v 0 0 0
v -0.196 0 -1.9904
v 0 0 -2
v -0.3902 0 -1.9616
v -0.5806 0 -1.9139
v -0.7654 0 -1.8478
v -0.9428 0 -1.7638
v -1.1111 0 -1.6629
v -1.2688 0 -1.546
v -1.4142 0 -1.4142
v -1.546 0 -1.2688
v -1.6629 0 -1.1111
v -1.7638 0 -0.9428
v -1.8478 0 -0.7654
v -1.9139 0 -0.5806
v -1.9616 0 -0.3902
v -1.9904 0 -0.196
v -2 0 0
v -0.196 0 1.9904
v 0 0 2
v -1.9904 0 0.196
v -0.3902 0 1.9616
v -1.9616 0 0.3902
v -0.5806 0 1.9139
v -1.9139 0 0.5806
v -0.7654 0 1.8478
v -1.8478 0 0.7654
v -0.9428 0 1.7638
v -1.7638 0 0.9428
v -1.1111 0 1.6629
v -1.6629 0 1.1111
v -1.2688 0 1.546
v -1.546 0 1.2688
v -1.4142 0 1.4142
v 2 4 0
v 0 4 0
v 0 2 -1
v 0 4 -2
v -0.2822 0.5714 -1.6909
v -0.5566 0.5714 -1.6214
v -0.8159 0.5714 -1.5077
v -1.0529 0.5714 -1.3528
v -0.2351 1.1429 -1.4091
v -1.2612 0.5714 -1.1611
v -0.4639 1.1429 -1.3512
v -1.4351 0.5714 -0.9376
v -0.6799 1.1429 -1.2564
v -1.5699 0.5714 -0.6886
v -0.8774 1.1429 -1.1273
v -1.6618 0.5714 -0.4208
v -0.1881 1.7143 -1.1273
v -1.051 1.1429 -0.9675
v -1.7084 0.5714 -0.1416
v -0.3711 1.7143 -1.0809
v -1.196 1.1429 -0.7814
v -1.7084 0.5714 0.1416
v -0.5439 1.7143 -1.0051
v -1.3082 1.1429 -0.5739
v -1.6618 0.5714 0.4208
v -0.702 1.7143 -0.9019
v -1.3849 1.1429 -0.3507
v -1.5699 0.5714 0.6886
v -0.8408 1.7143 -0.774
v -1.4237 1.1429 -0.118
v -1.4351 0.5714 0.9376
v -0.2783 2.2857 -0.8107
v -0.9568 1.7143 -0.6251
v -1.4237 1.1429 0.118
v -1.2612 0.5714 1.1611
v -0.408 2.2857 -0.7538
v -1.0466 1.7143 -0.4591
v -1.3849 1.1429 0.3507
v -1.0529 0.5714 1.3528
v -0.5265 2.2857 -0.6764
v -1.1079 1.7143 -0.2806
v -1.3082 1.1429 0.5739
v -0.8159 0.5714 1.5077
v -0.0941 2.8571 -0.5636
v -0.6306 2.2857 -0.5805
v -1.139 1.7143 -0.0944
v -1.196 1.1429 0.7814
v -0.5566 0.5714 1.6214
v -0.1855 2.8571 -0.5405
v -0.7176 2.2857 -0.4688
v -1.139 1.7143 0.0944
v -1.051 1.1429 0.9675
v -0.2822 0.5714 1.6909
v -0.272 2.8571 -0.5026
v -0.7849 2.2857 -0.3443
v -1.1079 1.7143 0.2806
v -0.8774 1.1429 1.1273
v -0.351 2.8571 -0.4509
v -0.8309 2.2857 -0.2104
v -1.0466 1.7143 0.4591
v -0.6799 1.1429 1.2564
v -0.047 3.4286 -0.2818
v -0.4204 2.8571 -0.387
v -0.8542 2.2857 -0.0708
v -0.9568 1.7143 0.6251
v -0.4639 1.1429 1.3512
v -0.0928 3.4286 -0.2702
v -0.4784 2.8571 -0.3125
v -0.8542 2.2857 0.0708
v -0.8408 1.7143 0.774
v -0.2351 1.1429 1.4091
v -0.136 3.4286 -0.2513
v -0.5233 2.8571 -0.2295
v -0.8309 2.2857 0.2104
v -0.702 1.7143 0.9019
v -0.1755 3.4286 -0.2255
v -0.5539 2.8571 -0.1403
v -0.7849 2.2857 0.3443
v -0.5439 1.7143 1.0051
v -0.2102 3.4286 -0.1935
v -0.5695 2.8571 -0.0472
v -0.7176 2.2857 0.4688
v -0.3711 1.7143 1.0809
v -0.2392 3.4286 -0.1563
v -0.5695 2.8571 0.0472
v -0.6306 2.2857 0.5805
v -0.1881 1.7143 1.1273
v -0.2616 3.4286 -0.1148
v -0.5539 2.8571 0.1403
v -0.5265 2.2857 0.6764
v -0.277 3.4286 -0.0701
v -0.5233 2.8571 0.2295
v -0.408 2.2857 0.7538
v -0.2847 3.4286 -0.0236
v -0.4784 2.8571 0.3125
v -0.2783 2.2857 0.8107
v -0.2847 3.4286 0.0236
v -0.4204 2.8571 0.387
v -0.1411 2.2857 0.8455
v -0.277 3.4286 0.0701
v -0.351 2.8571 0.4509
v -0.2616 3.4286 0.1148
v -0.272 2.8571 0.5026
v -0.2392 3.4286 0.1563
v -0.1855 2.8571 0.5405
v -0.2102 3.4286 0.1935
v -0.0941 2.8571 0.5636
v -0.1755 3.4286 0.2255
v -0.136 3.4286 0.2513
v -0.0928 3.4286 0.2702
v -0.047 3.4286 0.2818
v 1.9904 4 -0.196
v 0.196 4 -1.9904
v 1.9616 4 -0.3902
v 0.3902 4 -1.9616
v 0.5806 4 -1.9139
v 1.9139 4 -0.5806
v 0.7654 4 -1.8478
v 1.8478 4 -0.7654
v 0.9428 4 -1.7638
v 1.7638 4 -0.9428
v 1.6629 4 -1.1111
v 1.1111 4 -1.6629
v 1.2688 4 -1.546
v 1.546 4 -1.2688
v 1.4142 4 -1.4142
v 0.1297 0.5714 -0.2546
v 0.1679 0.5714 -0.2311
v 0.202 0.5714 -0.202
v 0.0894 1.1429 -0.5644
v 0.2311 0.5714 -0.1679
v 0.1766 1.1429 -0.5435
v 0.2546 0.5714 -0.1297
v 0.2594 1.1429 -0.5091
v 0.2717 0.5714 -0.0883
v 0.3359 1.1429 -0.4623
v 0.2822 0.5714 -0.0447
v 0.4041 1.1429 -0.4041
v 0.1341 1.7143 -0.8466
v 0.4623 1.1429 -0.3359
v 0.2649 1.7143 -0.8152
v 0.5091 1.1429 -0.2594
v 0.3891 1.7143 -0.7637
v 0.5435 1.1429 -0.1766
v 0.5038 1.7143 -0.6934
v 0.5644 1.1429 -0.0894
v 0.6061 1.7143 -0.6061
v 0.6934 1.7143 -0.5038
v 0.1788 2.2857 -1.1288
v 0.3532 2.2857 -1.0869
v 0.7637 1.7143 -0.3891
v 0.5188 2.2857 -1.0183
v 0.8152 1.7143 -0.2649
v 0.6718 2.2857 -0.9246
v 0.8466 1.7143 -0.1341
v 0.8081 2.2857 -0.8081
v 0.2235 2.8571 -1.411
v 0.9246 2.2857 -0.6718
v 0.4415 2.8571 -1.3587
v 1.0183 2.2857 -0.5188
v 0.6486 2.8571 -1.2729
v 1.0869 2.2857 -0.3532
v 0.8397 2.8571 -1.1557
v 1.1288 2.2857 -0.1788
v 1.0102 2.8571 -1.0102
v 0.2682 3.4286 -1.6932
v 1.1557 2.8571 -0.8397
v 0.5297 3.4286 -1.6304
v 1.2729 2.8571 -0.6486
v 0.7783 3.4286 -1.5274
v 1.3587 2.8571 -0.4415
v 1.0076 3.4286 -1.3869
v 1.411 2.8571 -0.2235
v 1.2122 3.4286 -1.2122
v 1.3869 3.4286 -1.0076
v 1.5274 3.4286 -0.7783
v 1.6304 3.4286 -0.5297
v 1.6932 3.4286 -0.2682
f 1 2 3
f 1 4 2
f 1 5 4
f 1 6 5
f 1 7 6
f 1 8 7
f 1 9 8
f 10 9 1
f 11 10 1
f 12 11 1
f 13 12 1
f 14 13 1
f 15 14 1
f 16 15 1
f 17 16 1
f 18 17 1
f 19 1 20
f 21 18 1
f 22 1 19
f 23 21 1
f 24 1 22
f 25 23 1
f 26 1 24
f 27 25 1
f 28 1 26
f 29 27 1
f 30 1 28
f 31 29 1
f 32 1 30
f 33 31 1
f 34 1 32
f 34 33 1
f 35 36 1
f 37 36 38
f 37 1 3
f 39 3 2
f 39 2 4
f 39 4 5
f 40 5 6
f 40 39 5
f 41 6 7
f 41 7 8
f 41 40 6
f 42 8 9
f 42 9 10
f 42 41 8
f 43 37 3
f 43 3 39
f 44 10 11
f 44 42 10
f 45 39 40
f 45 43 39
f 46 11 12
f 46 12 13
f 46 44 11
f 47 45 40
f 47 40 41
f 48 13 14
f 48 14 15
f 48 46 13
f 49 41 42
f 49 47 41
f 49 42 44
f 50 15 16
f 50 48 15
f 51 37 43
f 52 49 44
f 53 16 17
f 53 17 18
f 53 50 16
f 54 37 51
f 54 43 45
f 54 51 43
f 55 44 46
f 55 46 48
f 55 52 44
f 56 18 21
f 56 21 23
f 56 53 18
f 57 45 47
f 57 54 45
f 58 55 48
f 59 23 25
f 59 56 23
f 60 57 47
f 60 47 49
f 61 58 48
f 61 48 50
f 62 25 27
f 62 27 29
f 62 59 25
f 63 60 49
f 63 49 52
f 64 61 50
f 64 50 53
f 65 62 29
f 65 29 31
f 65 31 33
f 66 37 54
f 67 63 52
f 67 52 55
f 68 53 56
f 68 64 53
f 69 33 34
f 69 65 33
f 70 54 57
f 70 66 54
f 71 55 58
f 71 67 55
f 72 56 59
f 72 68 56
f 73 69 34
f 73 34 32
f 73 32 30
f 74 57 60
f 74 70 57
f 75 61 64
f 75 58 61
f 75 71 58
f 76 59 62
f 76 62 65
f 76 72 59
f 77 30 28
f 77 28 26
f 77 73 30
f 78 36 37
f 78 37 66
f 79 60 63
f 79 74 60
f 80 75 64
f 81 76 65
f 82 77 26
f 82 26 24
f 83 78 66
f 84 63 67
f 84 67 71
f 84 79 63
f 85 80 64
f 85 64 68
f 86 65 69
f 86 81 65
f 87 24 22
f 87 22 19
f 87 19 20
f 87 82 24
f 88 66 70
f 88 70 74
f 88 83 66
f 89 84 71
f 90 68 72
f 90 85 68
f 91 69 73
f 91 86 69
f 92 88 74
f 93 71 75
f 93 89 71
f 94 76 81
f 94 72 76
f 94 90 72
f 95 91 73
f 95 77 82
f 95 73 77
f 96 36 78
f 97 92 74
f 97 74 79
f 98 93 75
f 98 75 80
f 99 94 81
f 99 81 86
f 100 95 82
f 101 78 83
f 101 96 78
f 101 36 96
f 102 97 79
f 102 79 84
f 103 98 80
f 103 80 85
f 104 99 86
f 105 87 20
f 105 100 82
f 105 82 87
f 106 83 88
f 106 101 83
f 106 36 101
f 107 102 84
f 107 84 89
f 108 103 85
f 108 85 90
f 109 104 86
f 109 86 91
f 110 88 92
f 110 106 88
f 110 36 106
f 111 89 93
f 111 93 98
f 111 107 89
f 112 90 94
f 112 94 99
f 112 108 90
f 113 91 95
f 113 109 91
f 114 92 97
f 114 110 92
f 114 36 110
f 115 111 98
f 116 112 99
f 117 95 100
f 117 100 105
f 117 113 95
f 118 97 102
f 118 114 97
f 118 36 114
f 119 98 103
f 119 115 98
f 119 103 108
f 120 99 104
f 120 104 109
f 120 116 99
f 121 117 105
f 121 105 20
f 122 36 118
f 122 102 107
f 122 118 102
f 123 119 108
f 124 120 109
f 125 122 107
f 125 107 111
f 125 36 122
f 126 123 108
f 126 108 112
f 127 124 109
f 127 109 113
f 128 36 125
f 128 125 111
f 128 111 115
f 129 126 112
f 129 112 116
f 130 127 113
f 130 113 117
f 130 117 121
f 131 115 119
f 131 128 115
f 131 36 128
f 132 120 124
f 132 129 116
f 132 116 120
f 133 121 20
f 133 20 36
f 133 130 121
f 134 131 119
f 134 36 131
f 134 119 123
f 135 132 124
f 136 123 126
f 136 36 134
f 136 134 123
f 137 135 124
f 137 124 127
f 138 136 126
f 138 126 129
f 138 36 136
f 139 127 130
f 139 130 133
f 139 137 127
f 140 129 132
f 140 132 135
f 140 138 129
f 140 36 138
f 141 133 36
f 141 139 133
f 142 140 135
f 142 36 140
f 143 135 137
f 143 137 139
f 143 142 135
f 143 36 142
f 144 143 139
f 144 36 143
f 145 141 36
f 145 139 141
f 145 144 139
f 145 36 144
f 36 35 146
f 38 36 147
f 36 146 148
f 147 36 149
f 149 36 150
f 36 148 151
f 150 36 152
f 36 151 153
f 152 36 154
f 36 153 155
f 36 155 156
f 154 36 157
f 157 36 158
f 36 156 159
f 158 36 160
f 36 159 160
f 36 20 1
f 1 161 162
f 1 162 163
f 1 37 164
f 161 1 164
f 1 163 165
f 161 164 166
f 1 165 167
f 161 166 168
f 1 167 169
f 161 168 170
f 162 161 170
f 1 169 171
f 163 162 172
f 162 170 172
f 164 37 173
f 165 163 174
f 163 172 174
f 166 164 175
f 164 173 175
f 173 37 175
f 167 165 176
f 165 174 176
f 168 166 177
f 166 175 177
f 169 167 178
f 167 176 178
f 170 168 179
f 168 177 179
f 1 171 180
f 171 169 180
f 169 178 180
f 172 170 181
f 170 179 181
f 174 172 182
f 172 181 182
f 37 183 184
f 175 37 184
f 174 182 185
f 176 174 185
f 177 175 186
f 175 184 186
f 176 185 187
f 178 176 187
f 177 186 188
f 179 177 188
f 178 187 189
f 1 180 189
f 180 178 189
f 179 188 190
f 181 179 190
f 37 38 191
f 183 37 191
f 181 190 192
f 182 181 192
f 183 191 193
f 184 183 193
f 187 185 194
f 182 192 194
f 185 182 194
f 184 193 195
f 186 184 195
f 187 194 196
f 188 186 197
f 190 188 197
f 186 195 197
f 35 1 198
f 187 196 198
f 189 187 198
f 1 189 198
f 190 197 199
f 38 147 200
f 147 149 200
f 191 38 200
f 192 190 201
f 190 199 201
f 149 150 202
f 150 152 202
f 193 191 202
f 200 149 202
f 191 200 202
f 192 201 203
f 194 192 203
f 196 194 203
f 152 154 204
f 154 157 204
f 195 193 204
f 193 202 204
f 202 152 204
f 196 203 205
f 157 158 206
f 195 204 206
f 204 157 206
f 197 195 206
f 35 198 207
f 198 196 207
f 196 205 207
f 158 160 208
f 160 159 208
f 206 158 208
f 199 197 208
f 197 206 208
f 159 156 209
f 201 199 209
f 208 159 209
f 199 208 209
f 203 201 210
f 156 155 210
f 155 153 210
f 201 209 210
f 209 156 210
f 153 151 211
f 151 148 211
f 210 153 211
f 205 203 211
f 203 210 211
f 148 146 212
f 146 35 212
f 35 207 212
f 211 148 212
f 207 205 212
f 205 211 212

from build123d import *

# Parameters (mm, degrees)
REVOLVE1_ANGLE = 180
REVOLVE2_ANGLE = 90


with BuildPart() as part:
    # Sketch1 → Revolve1 (revolve)
    with BuildSketch(Plane(origin=(0, 0, 0), x_dir=(0, 0, -1), z_dir=(1, 0, 0))):
        Polygon((0, 0), (2, 0), (0, 4), align=None)
    revolve(axis=Axis((0, 4, 0), (0, 1, 0)), revolution_arc=REVOLVE1_ANGLE)

    # Sketch2 → Revolve2 (revolve)
    with BuildSketch(Plane(origin=(0, 0, 0), x_dir=(0, 0, -1), z_dir=(1, 0, 0))):
        Polygon((0, 0), (2, 4), (0, 4), align=None)
    revolve(axis=Axis((0, 4, 0), (0, -1, 0)), revolution_arc=REVOLVE2_ANGLE)


solid = part.part
